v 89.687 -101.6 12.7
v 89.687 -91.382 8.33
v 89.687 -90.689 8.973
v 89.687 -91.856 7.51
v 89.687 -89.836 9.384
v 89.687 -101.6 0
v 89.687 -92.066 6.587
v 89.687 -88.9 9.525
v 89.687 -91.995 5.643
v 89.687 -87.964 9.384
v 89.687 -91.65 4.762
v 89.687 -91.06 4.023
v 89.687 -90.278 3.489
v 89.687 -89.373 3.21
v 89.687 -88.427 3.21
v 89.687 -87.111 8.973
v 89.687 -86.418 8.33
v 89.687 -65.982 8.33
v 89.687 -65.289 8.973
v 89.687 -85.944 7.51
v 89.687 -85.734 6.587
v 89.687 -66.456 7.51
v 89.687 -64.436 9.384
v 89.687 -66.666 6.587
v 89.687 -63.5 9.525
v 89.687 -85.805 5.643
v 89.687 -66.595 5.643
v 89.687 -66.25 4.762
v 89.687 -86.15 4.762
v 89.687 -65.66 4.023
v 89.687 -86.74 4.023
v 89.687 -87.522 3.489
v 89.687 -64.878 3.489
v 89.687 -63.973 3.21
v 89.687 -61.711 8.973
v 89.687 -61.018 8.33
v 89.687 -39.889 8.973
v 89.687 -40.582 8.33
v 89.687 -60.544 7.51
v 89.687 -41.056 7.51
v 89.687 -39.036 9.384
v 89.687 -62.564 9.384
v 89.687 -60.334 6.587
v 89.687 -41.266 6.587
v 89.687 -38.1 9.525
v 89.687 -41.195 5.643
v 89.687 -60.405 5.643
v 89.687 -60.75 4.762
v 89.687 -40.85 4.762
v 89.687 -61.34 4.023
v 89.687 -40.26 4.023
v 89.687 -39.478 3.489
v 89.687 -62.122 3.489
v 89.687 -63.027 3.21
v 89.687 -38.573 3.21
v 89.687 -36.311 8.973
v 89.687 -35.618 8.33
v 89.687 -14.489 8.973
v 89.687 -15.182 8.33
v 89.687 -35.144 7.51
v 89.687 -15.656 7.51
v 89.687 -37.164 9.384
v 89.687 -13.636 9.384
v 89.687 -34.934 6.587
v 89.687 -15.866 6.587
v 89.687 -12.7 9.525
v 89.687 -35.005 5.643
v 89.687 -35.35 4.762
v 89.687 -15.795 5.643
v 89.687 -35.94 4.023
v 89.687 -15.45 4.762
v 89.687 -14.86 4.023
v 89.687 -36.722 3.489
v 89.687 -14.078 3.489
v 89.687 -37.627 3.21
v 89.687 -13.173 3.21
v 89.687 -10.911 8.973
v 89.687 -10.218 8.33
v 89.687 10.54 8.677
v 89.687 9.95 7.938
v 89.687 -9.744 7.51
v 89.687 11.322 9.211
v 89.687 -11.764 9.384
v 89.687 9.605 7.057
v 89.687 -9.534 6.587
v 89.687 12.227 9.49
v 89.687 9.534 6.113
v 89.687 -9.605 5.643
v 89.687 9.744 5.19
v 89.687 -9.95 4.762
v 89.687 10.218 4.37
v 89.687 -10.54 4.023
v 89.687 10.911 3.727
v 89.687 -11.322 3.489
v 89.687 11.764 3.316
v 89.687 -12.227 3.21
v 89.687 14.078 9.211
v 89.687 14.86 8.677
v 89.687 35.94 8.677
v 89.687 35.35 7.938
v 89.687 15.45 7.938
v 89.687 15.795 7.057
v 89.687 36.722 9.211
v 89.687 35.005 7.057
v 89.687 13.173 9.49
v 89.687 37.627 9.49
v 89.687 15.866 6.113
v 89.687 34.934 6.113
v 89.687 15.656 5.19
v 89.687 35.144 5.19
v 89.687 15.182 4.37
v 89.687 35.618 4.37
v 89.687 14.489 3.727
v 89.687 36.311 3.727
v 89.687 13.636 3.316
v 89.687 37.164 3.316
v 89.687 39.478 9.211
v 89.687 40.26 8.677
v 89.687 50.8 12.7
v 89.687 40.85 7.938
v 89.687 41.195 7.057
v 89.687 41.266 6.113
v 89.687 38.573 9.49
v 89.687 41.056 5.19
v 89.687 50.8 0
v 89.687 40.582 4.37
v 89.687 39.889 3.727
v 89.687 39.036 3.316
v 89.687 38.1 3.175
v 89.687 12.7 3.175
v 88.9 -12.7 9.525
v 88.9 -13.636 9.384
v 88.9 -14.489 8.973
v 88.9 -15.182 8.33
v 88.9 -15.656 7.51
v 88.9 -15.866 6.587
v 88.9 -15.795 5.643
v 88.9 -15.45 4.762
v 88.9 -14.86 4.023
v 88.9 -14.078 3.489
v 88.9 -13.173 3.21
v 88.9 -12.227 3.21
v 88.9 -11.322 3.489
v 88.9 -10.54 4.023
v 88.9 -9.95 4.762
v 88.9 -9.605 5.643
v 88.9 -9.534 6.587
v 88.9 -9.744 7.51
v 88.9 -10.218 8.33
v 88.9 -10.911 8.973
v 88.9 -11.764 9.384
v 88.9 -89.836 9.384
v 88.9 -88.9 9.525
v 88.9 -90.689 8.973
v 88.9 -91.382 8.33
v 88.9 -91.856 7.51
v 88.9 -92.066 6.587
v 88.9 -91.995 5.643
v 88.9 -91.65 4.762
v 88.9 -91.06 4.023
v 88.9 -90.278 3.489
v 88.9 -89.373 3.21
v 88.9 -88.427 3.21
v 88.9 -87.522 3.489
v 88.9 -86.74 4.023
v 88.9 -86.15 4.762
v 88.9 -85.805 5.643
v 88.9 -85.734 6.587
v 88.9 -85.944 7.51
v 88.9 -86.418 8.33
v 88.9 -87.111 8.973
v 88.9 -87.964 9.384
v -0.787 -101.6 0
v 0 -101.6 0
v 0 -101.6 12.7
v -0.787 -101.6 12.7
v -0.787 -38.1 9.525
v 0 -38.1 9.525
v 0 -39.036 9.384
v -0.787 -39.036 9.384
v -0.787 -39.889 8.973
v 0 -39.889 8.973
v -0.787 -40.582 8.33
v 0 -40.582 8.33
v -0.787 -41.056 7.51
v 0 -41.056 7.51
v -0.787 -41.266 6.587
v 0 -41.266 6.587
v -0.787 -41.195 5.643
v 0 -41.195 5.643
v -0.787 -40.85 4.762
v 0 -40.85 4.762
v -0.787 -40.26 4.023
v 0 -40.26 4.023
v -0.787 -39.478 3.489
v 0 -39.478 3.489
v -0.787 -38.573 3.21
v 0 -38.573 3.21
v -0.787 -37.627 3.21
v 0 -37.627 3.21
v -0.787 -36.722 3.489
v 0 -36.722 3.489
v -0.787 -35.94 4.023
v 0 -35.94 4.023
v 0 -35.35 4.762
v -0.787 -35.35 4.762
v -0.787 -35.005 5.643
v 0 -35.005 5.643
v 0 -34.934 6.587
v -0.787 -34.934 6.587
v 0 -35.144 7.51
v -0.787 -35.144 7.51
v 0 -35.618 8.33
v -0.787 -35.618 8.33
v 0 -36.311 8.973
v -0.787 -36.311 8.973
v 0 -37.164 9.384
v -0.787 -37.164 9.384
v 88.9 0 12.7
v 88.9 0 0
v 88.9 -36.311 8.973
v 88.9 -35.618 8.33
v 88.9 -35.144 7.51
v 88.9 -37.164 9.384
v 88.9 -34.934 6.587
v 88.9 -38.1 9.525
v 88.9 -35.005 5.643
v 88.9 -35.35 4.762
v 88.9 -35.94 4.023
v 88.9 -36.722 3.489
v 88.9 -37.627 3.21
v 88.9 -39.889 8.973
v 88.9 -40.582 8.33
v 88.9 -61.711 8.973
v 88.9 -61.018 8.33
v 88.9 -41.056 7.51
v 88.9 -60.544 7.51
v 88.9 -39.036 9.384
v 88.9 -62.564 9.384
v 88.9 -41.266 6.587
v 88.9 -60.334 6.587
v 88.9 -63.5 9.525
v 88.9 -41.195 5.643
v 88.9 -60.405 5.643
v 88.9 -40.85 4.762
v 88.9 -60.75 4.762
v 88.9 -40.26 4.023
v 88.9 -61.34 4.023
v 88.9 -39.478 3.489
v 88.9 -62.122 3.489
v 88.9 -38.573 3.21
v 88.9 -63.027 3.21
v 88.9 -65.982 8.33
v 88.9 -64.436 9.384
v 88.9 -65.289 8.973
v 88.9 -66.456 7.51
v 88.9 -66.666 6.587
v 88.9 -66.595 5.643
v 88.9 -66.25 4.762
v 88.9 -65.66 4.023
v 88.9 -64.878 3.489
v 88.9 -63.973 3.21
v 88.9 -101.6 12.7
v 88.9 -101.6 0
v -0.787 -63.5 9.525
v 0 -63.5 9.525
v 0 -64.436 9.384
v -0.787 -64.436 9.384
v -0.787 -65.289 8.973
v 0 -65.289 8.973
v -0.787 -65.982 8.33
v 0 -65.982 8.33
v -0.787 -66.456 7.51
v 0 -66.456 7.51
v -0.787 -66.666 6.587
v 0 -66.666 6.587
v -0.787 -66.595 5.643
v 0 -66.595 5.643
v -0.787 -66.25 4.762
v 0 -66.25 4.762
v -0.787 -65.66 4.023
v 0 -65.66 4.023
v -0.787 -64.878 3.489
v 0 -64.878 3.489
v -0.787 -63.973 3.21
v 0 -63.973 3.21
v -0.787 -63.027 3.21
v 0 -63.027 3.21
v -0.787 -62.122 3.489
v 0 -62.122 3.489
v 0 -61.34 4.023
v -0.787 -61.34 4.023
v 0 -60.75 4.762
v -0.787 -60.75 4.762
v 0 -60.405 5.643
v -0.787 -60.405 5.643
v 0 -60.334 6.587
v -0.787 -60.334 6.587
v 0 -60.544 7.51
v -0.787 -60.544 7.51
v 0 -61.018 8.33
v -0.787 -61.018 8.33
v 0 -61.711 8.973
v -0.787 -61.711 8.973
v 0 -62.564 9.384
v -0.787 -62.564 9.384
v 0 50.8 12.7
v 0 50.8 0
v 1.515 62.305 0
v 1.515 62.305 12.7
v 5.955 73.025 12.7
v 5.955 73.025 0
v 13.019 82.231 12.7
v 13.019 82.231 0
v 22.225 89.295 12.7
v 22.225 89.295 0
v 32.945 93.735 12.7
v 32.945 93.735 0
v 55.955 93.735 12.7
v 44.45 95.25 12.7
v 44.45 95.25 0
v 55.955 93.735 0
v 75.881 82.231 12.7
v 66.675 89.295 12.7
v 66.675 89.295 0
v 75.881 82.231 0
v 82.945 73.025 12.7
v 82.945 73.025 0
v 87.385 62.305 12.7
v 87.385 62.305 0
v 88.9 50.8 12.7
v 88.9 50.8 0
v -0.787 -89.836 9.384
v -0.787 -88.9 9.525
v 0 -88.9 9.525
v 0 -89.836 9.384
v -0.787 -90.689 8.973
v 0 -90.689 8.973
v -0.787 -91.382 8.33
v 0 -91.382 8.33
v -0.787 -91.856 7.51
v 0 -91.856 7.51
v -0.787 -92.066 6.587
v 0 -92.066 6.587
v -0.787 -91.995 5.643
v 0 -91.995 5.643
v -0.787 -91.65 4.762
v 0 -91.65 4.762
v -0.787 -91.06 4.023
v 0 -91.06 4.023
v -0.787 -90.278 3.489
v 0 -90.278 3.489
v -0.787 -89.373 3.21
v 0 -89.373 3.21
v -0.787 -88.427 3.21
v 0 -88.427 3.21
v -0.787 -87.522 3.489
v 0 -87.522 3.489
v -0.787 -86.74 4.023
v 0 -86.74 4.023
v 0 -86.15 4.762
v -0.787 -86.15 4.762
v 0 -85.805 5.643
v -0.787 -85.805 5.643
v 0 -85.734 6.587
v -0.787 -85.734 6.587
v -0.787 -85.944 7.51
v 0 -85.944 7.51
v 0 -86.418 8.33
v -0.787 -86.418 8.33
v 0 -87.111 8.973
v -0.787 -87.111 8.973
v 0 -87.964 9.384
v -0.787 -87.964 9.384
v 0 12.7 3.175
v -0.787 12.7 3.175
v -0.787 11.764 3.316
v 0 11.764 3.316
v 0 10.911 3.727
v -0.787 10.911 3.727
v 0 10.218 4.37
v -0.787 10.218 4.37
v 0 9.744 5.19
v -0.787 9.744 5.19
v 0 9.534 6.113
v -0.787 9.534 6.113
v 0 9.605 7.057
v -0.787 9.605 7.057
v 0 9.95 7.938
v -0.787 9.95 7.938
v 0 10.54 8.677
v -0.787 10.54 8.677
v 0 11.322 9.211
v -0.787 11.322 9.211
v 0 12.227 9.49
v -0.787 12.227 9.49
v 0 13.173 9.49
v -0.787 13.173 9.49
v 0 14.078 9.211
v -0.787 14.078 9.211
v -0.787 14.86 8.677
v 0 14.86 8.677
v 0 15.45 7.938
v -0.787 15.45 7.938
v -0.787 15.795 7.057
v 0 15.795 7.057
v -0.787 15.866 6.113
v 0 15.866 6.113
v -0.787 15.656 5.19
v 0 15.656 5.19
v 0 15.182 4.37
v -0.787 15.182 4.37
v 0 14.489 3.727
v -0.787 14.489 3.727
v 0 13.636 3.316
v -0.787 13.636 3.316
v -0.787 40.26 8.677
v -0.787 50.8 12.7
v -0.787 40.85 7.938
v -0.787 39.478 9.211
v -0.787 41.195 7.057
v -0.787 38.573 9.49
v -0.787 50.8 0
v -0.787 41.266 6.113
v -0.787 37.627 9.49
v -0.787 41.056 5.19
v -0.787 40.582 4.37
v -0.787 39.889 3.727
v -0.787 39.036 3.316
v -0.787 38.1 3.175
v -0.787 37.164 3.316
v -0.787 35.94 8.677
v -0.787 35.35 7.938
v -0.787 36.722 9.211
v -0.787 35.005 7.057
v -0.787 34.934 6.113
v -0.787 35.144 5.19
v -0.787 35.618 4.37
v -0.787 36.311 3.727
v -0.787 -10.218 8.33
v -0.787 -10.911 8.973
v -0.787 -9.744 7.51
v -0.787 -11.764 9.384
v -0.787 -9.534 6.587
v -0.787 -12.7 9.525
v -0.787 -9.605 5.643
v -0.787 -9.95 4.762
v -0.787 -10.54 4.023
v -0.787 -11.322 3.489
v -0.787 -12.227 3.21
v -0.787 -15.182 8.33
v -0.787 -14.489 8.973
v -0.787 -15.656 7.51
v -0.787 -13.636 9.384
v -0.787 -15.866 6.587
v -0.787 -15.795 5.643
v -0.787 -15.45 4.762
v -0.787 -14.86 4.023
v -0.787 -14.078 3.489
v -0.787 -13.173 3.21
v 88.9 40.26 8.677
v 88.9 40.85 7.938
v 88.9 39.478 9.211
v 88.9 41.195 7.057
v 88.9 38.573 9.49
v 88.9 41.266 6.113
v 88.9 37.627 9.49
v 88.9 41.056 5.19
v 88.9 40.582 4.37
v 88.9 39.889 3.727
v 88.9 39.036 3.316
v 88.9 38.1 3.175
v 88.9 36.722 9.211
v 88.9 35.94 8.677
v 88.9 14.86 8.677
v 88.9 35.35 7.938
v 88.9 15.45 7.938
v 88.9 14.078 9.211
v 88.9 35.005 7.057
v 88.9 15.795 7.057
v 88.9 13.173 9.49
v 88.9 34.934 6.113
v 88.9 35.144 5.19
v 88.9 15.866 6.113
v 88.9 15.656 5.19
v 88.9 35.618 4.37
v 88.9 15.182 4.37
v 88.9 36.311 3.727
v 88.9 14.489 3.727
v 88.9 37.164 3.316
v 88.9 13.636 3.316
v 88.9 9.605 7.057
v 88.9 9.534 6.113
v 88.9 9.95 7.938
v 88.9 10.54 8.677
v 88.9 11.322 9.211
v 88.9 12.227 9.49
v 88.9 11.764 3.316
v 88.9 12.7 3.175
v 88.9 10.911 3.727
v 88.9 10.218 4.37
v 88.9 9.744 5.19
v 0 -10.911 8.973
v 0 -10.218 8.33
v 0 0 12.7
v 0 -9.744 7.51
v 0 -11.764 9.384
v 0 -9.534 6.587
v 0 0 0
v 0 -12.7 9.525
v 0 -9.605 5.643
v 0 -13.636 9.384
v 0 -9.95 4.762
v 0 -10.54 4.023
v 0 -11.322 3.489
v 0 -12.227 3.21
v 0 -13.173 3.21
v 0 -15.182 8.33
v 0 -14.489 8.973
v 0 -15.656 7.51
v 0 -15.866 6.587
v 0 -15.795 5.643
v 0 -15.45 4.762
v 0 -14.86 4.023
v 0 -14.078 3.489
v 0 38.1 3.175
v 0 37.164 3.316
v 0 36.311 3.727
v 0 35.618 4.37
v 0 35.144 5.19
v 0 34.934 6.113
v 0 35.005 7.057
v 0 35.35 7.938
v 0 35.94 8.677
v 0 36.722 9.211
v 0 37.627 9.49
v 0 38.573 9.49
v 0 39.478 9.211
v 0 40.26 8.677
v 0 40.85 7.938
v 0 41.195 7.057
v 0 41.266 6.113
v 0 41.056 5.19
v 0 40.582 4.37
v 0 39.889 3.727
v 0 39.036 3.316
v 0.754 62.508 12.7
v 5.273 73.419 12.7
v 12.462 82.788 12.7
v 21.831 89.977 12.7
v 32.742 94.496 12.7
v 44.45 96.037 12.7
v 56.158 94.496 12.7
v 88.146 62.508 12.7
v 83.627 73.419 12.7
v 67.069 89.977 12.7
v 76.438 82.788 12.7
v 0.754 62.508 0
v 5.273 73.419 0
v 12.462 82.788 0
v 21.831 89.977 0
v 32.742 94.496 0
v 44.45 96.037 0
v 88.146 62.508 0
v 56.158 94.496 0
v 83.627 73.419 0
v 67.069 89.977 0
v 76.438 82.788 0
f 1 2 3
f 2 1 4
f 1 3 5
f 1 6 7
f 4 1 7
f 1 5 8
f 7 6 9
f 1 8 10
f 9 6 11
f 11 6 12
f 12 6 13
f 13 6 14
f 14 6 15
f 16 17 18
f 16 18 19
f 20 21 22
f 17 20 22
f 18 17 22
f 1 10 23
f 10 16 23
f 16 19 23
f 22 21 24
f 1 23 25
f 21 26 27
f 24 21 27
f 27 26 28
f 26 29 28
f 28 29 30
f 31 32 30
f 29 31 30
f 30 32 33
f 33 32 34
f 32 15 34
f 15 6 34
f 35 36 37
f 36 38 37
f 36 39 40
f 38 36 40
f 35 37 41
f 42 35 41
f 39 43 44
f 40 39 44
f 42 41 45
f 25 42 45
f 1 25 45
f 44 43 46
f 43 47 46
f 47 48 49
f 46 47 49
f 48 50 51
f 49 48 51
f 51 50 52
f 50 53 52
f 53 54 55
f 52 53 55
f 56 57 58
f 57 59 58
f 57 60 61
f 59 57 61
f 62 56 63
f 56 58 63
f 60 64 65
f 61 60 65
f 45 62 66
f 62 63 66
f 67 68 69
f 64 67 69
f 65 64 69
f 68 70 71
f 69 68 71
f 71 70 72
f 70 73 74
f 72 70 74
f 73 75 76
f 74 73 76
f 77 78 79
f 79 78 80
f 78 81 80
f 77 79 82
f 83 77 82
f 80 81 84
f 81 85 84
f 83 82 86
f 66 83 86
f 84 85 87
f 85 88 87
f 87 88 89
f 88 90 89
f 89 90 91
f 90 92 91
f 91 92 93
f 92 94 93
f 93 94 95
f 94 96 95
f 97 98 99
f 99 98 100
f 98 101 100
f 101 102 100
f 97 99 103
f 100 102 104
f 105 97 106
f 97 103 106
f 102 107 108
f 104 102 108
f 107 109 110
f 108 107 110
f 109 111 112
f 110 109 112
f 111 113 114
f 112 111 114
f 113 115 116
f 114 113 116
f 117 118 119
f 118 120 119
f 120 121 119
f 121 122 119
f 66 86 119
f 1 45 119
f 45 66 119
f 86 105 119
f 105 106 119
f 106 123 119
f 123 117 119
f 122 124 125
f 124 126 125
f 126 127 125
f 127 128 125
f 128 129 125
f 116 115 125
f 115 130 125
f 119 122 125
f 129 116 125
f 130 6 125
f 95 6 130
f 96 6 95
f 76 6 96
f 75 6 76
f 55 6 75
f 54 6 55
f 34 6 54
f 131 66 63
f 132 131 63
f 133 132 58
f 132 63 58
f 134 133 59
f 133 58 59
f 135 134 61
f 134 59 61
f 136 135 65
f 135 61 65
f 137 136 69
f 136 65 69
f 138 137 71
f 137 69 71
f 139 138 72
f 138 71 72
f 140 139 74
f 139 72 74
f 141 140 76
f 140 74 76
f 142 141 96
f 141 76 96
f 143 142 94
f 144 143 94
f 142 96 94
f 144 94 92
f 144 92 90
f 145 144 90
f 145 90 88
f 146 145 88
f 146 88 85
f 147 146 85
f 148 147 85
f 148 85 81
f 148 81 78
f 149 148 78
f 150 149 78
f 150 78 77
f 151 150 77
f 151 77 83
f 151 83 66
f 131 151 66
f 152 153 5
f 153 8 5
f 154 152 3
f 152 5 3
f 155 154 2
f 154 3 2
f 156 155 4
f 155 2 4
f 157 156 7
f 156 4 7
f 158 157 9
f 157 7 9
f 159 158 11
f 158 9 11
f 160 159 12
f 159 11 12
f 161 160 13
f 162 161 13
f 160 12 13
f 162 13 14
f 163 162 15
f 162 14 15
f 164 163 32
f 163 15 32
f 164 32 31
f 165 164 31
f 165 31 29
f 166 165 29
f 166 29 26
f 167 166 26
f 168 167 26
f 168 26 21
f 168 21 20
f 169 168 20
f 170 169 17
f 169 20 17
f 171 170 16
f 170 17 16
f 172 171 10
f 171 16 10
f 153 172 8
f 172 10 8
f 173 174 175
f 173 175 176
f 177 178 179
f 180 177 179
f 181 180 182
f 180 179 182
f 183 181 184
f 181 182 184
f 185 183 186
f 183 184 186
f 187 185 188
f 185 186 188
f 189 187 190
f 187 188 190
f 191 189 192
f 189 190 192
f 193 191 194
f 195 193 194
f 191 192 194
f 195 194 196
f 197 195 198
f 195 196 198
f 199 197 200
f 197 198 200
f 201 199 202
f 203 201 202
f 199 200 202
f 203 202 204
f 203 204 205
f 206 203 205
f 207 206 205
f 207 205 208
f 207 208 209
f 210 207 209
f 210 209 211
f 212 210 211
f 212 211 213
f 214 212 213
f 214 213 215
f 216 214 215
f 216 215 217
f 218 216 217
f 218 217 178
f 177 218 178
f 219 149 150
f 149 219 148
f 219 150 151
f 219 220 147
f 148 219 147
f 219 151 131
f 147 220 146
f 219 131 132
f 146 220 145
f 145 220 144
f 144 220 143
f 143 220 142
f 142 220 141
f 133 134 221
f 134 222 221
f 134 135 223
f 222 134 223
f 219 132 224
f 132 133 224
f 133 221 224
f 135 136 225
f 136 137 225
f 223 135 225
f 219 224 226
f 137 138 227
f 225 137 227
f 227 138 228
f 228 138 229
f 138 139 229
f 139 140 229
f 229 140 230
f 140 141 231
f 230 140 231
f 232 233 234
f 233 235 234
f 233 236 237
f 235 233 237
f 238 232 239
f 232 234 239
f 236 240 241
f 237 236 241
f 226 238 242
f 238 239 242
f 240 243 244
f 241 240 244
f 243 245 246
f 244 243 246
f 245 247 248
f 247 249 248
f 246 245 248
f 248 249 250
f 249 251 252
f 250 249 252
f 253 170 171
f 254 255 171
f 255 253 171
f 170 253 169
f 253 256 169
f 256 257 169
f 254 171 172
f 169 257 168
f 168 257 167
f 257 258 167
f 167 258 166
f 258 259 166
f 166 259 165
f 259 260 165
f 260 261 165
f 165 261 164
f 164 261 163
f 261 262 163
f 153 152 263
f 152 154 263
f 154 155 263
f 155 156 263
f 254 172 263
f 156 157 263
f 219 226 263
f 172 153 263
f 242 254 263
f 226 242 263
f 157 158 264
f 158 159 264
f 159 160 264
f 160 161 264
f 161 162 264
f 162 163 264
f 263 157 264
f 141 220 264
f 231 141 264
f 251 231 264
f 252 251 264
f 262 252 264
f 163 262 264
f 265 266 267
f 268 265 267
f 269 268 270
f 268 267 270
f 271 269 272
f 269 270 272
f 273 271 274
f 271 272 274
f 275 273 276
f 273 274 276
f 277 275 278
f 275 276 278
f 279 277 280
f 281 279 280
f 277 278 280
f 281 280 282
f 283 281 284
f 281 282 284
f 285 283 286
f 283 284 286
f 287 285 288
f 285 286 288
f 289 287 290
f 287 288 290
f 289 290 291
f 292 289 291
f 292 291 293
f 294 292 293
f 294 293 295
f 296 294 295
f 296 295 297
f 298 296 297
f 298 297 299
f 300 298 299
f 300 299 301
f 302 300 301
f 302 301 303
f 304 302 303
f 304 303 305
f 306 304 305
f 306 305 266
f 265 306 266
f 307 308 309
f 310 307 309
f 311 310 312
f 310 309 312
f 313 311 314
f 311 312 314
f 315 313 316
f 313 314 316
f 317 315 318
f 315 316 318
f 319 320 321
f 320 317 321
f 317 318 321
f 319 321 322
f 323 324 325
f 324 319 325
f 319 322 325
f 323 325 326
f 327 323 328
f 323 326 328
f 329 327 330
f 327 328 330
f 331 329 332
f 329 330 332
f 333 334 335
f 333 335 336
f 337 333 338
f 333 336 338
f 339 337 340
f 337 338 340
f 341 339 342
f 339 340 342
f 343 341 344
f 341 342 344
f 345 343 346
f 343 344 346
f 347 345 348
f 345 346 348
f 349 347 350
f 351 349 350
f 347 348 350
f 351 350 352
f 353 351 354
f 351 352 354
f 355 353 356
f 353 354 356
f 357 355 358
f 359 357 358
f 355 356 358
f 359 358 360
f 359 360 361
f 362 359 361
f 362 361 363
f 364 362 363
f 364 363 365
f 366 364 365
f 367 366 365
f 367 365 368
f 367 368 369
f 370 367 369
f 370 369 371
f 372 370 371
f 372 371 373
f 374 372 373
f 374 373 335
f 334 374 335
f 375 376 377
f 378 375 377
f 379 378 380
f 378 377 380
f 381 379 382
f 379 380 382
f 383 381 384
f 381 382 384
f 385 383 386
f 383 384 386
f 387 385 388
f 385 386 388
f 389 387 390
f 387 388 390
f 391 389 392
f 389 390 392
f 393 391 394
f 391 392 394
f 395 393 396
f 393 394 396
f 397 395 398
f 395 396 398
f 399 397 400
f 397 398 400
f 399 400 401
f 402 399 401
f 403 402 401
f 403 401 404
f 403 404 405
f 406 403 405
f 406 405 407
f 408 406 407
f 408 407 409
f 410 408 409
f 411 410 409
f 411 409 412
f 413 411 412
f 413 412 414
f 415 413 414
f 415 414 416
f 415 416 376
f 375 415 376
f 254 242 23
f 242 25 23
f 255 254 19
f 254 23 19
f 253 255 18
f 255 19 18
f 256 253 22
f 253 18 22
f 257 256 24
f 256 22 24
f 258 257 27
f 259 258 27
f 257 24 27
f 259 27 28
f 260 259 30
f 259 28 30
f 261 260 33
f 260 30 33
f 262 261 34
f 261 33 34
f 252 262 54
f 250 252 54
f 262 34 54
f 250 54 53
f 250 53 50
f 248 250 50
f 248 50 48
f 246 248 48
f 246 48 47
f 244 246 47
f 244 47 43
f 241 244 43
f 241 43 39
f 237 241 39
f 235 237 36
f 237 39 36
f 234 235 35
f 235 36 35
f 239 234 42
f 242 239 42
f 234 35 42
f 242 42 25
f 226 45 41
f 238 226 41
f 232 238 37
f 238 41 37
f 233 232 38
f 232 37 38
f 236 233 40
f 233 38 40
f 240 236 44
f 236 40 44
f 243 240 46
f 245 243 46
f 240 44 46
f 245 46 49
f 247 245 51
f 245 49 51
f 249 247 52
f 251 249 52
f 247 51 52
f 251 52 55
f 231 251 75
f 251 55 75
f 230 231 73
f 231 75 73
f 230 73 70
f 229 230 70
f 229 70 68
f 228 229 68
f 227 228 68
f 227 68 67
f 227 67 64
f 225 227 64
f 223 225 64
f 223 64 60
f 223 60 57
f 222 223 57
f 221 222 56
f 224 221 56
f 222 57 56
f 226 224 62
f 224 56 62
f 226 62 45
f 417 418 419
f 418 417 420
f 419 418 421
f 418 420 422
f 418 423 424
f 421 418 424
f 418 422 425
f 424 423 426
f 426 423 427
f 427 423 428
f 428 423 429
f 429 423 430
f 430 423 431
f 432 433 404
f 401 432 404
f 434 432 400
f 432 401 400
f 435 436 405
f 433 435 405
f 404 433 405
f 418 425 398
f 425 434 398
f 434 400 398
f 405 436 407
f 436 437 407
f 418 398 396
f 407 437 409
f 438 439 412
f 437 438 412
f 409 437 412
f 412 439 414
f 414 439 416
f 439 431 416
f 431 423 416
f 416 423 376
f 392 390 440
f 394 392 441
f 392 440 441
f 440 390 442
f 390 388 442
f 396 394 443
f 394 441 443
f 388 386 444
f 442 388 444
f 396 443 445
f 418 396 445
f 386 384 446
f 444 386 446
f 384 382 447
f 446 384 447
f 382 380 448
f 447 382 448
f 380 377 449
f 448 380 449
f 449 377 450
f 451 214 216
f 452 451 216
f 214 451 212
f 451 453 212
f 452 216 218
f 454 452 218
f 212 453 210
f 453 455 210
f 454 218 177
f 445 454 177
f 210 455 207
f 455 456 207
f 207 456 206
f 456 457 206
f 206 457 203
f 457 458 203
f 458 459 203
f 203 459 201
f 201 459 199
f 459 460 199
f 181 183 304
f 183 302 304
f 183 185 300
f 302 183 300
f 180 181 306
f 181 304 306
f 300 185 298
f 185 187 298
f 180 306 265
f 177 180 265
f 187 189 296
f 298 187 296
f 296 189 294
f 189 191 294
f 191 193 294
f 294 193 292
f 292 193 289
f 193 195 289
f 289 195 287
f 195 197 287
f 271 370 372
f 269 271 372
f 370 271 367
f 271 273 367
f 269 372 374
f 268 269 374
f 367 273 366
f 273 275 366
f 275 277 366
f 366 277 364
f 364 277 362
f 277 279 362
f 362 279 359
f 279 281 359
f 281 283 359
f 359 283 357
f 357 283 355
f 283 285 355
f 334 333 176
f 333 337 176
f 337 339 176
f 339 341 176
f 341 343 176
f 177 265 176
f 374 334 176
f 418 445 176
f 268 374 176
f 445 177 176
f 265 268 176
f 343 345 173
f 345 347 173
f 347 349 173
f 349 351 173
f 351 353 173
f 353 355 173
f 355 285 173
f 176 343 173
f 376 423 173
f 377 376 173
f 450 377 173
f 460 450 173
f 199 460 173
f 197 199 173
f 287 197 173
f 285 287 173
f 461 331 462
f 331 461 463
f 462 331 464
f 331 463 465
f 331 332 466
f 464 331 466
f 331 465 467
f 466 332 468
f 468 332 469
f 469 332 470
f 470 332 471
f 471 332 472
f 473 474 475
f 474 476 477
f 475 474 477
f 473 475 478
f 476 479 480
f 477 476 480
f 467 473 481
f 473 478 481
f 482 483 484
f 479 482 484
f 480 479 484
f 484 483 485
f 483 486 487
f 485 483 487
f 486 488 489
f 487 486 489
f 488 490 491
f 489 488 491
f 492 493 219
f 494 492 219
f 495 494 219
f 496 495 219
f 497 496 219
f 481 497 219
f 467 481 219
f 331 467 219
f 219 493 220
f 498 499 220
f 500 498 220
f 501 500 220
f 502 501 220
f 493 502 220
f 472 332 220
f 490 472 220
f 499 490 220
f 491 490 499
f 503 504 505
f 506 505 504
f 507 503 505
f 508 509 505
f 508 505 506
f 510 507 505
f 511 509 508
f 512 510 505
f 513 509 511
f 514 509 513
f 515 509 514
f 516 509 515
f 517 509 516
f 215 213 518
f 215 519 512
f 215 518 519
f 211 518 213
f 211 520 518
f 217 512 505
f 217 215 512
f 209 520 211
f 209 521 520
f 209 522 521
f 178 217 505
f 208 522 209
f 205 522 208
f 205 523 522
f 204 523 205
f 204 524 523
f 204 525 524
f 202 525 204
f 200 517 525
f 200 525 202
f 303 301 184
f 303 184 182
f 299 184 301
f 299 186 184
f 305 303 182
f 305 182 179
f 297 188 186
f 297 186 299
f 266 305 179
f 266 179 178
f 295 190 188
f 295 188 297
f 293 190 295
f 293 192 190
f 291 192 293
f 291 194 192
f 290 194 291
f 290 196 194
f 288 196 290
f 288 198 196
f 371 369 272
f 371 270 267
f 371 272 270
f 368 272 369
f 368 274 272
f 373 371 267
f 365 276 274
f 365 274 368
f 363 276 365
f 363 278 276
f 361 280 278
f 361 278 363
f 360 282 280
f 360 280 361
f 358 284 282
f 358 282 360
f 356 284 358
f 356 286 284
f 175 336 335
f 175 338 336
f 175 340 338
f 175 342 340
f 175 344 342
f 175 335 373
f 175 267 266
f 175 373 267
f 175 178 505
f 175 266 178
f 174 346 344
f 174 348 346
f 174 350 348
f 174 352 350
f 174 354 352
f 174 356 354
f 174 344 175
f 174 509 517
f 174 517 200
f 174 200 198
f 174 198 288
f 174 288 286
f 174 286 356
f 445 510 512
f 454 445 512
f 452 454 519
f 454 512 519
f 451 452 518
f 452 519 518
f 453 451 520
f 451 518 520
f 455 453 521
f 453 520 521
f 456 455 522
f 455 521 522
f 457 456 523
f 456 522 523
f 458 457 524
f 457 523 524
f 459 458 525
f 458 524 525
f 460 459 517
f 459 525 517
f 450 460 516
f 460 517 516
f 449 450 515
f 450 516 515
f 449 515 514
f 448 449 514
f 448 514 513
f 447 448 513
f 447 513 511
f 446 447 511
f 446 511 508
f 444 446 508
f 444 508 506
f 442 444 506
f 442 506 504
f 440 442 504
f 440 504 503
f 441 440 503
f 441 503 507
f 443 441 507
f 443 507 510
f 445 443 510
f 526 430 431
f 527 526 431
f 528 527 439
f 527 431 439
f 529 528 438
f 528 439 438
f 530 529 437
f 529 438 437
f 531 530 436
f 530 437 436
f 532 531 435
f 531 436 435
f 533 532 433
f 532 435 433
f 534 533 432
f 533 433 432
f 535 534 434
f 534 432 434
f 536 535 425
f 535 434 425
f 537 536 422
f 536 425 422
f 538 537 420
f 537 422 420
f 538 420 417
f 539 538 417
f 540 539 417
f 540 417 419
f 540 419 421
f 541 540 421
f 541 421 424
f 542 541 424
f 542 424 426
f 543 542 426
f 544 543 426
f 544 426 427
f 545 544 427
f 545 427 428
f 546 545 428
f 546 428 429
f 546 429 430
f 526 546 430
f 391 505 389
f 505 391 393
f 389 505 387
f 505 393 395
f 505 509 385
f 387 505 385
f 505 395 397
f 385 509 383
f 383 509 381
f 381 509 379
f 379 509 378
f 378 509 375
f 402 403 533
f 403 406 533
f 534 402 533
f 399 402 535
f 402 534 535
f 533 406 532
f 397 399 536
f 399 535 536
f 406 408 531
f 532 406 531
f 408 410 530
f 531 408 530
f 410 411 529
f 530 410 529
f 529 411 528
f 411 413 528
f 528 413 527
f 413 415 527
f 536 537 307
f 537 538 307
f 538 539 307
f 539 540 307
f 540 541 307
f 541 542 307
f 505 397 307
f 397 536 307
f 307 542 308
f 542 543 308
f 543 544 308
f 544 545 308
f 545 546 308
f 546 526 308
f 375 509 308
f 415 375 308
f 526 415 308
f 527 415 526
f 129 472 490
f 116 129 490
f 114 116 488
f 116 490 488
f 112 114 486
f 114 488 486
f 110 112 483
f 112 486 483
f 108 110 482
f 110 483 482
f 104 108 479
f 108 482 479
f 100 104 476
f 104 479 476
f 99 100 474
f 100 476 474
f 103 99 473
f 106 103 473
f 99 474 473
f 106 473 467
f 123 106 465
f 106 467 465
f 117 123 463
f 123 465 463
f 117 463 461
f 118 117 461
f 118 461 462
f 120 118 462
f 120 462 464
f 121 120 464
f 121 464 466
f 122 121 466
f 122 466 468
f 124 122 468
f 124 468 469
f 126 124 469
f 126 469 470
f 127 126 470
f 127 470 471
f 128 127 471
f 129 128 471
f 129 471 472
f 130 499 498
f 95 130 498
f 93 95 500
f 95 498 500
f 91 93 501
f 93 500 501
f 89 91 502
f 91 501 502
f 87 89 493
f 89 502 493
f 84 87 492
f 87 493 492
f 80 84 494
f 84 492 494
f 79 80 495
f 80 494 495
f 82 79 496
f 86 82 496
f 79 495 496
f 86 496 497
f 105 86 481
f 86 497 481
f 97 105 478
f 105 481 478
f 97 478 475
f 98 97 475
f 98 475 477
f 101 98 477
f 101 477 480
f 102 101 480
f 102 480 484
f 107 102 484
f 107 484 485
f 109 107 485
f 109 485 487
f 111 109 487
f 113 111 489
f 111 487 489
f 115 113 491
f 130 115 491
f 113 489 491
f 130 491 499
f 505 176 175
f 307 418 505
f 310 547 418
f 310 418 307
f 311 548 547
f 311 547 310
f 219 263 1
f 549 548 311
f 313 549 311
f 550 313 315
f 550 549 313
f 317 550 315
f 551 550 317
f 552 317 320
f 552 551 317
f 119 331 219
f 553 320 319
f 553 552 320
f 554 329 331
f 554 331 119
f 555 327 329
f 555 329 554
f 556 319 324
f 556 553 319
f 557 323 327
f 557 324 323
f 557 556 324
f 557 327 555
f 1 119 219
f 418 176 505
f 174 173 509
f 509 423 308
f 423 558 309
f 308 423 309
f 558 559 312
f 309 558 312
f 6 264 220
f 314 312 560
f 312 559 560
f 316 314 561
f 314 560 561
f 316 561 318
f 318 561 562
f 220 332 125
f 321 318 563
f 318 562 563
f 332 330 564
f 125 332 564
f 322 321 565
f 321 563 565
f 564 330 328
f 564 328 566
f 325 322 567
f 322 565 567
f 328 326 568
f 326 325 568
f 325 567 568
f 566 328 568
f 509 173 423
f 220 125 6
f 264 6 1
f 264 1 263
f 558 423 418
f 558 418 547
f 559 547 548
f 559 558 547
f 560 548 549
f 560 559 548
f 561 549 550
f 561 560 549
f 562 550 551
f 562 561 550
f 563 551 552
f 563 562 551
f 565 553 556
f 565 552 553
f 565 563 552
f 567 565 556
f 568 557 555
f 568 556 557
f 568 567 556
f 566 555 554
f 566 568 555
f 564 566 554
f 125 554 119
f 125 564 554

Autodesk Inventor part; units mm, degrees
ref_plane "YZ Plane" through (0, 0, 0) normal (1, 0, 0) x (0, 1, 0)
ref_plane "XZ Plane" through (0, 0, 0) normal (0, 1, 0) x (-1, 0, 0)
ref_plane "XY Plane" through (0, 0, 0) normal (0, 0, 1) x (1, 0, 0)
sketch "Sketch1" plane through (0, 0, 0) normal (0, 0, 1) x (1, 0, 0)
  line L0 (0, 0) -> (0, 50.8)
  arc A0 (88.9, 50.8) -> (0, 50.8) centre (44.45, 50.8) ccw
  line L1 (88.9, 50.8) -> (88.9, 0)
  line L2 (89.6874, 0) -> (89.6874, 50.8)
  arc A1 (89.6874, 50.8) -> (-0.7874, 50.8) centre (44.45, 50.8) ccw
  line L3 (-0.7874, 50.8) -> (-0.7874, 0)
  line L4 (-0.7874, 50.8) -> (50.0126, 50.8) construction
  line L5 (88.9, 0) -> (88.8999, -101.6)
  line L6 (89.6874, -1.5875) -> (89.6874, -101.6)
  line L7 (89.6874, -101.6) -> (88.8999, -101.6)
  line L8 (-0.7874, 0) -> (-0.7874, -101.6)
  line L9 (0, 0) -> (-0.0001, -101.6)
  line L10 (-0.0001, -101.6) -> (-0.7874, -101.6)
  line L11 (89.6874, 0) -> (89.6874, -1.5875)
  dimension "d1" = 88.9
  dimension "d2" = 44.45
  dimension "d3" = 50.8
  dimension "d5" = 50.8
  dimension "d6" = 90.4748
  dimension "d7" = 45.2374
  dimension "d8" = 50.8
  dimension "d9" = 90
  dimension "d30" = 101.6
  dimension "d32" = 101.6
extrude "Extrusion1" add sketch "Sketch1" along normal blind 12.7
hole "Hole1" at (89.6874, 12.7, 6.35) direction (-1, 0, 0) diameter 6.35 end through all
hole "Hole2" at (89.6874, 38.1, 6.35) direction (-1, 0, 0) diameter 6.35 end through all
sketch "Sketch3" plane through (-0.7874, -101.6, 0) normal (-1, 0, 0) x (0, 0, 1)
  line L0 (0, 101.6) -> (12.7, 101.6) projected
  line L1 (6.35, 101.6) -> (6.35, 88.9)
  line L2 (6.35, 88.9) -> (6.35, 63.5)
  dimension "d36" = 12.7
  dimension "d37" = 25.4
sketch "Sketch4" plane through (-0.7874, 0, 0) normal (-1, 0, 0) x (0, 0, 1)
  circle A0 centre (6.35, 38.1) radius 3.175 projected
  circle A1 centre (6.35, 12.7) radius 3.175 projected
  line L0 (0, 50.8) -> (0, 0) projected
  line L1 (0, 0) -> (12.7, 0) projected
  line L2 (12.7, 50.8) -> (12.7, 0) projected
  line L3 (0, 50.8) -> (12.7, 50.8) projected
  dimension "d34" = 12.7
hole "Hole3" at (-0.7874, -12.7, 6.35) direction (1, 0, 0) diameter 6.35 end through all
sketch "Sketch5" plane through (-0.7874, -101.6, 0) normal (-1, 0, 0) x (0, 0, 1)
  circle A0 centre (6.35, 88.9) radius 3.175 projected
  line L0 (0, 0) -> (12.7, 0) projected
  line L1 (0, 101.6) -> (12.7, 101.6) projected
  line L2 (6.35, 88.9) -> (6.35, 63.5)
  line L3 (6.35, 88.9) -> (31.75, 88.9) construction
  line L4 (6.35, 63.5) -> (6.35, 38.1)
  line L5 (6.35, 38.1) -> (6.35, 12.7)
  dimension "d45" = 25.4
  dimension "d46" = 90
  dimension "d47" = 25.4
  dimension "d48" = 25.4
hole "Hole4" at (-0.7874, -38.1, 6.35) direction (1, 0, 0) diameter 6.35 end through all
sketch "Sketch6" plane through (-0.7874, -101.6, 0) normal (-1, 0, 0) x (0, 0, 1)
  circle A0 centre (6.35, 63.5) radius 3.175 projected
  line L0 (0, 101.6) -> (12.7, 101.6) projected
  line L1 (6.35, 63.5) -> (6.35, 38.1)
  dimension "d56" = 25.4
hole "Hole5" at (-0.7874, -63.5, 6.35) direction (1, 0, 0) diameter 6.35 end through all
sketch "Sketch7" plane through (-0.7874, -101.6, 0) normal (-1, 0, 0) x (0, 0, 1)
  circle A0 centre (6.35, 38.1) radius 3.175 projected
  line L0 (0, 101.6) -> (12.7, 101.6) projected
  line L1 (6.35, 38.1) -> (6.35, 12.7)
  dimension "d64" = 25.4
hole "Hole6" at (-0.7874, -88.9, 6.35) direction (1, 0, 0) diameter 6.35 end through all
properties part number "Strap"
